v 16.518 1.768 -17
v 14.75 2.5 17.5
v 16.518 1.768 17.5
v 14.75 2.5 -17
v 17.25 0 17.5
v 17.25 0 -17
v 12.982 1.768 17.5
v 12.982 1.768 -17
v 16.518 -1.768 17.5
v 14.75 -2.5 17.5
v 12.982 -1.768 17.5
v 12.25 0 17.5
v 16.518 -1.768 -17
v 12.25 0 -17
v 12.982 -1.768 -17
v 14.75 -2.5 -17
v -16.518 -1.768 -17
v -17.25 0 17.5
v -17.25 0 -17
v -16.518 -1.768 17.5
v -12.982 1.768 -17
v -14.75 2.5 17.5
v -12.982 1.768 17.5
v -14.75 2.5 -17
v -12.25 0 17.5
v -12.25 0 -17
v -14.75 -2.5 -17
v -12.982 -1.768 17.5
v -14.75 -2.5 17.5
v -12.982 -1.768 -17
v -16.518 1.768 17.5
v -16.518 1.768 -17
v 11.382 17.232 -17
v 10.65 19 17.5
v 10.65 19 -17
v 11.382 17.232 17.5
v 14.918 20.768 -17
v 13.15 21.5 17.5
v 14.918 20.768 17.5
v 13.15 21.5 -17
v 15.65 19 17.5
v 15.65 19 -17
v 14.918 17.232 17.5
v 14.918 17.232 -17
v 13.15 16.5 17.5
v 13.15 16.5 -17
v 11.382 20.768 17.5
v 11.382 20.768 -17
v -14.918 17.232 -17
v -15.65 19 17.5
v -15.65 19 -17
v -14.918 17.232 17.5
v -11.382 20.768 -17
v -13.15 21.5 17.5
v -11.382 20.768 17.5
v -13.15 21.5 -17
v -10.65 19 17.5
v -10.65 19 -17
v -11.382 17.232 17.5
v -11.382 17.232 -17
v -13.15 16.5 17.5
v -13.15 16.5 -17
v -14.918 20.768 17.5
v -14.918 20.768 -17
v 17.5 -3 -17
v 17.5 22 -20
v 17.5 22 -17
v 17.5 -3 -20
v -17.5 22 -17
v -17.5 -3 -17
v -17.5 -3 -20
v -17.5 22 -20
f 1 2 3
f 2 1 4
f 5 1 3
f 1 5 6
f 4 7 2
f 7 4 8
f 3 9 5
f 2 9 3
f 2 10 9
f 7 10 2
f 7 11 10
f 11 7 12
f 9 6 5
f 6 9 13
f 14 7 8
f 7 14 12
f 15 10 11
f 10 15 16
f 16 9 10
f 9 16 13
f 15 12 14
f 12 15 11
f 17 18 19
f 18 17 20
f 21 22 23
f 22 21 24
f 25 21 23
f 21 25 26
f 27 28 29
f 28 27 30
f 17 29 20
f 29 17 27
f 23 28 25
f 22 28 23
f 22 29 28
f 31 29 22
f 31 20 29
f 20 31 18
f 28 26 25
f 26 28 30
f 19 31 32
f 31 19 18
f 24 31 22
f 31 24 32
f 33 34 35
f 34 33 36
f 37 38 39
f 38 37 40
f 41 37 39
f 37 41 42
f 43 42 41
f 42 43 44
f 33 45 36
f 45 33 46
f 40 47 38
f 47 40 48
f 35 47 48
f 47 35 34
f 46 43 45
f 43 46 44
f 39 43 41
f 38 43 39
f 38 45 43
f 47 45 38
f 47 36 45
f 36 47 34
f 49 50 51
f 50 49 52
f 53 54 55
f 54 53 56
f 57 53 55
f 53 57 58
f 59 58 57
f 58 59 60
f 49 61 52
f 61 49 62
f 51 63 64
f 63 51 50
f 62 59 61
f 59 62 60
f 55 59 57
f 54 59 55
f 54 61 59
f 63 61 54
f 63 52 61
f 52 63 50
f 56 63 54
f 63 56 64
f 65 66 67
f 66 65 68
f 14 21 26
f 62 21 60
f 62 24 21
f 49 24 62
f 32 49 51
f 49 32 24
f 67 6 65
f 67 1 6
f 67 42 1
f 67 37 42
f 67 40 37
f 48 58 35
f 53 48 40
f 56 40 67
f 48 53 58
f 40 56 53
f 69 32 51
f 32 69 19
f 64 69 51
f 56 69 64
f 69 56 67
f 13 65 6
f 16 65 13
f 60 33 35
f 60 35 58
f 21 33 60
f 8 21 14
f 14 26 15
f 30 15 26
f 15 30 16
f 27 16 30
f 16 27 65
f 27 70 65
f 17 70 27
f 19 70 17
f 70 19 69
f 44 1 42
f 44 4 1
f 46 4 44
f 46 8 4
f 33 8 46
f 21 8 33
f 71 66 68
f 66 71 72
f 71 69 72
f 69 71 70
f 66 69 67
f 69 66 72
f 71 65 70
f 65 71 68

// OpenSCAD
h = 35;
d = 5;

o1= 29.5;
o2 = 26.3;


for(i = [2, -2]) {
  translate([o1/i, 0, 0]) cylinder(h=h, d=d, center=true);
}

translate([0, 19, 0])
  for(i = [2, -2]) {
    translate([o2/i, 0, 0]) cylinder(h=h, d=d, center=true);
  }

translate([0, 9.5, h/-2 - 1])
cube([35, 25, 3], center=true);
